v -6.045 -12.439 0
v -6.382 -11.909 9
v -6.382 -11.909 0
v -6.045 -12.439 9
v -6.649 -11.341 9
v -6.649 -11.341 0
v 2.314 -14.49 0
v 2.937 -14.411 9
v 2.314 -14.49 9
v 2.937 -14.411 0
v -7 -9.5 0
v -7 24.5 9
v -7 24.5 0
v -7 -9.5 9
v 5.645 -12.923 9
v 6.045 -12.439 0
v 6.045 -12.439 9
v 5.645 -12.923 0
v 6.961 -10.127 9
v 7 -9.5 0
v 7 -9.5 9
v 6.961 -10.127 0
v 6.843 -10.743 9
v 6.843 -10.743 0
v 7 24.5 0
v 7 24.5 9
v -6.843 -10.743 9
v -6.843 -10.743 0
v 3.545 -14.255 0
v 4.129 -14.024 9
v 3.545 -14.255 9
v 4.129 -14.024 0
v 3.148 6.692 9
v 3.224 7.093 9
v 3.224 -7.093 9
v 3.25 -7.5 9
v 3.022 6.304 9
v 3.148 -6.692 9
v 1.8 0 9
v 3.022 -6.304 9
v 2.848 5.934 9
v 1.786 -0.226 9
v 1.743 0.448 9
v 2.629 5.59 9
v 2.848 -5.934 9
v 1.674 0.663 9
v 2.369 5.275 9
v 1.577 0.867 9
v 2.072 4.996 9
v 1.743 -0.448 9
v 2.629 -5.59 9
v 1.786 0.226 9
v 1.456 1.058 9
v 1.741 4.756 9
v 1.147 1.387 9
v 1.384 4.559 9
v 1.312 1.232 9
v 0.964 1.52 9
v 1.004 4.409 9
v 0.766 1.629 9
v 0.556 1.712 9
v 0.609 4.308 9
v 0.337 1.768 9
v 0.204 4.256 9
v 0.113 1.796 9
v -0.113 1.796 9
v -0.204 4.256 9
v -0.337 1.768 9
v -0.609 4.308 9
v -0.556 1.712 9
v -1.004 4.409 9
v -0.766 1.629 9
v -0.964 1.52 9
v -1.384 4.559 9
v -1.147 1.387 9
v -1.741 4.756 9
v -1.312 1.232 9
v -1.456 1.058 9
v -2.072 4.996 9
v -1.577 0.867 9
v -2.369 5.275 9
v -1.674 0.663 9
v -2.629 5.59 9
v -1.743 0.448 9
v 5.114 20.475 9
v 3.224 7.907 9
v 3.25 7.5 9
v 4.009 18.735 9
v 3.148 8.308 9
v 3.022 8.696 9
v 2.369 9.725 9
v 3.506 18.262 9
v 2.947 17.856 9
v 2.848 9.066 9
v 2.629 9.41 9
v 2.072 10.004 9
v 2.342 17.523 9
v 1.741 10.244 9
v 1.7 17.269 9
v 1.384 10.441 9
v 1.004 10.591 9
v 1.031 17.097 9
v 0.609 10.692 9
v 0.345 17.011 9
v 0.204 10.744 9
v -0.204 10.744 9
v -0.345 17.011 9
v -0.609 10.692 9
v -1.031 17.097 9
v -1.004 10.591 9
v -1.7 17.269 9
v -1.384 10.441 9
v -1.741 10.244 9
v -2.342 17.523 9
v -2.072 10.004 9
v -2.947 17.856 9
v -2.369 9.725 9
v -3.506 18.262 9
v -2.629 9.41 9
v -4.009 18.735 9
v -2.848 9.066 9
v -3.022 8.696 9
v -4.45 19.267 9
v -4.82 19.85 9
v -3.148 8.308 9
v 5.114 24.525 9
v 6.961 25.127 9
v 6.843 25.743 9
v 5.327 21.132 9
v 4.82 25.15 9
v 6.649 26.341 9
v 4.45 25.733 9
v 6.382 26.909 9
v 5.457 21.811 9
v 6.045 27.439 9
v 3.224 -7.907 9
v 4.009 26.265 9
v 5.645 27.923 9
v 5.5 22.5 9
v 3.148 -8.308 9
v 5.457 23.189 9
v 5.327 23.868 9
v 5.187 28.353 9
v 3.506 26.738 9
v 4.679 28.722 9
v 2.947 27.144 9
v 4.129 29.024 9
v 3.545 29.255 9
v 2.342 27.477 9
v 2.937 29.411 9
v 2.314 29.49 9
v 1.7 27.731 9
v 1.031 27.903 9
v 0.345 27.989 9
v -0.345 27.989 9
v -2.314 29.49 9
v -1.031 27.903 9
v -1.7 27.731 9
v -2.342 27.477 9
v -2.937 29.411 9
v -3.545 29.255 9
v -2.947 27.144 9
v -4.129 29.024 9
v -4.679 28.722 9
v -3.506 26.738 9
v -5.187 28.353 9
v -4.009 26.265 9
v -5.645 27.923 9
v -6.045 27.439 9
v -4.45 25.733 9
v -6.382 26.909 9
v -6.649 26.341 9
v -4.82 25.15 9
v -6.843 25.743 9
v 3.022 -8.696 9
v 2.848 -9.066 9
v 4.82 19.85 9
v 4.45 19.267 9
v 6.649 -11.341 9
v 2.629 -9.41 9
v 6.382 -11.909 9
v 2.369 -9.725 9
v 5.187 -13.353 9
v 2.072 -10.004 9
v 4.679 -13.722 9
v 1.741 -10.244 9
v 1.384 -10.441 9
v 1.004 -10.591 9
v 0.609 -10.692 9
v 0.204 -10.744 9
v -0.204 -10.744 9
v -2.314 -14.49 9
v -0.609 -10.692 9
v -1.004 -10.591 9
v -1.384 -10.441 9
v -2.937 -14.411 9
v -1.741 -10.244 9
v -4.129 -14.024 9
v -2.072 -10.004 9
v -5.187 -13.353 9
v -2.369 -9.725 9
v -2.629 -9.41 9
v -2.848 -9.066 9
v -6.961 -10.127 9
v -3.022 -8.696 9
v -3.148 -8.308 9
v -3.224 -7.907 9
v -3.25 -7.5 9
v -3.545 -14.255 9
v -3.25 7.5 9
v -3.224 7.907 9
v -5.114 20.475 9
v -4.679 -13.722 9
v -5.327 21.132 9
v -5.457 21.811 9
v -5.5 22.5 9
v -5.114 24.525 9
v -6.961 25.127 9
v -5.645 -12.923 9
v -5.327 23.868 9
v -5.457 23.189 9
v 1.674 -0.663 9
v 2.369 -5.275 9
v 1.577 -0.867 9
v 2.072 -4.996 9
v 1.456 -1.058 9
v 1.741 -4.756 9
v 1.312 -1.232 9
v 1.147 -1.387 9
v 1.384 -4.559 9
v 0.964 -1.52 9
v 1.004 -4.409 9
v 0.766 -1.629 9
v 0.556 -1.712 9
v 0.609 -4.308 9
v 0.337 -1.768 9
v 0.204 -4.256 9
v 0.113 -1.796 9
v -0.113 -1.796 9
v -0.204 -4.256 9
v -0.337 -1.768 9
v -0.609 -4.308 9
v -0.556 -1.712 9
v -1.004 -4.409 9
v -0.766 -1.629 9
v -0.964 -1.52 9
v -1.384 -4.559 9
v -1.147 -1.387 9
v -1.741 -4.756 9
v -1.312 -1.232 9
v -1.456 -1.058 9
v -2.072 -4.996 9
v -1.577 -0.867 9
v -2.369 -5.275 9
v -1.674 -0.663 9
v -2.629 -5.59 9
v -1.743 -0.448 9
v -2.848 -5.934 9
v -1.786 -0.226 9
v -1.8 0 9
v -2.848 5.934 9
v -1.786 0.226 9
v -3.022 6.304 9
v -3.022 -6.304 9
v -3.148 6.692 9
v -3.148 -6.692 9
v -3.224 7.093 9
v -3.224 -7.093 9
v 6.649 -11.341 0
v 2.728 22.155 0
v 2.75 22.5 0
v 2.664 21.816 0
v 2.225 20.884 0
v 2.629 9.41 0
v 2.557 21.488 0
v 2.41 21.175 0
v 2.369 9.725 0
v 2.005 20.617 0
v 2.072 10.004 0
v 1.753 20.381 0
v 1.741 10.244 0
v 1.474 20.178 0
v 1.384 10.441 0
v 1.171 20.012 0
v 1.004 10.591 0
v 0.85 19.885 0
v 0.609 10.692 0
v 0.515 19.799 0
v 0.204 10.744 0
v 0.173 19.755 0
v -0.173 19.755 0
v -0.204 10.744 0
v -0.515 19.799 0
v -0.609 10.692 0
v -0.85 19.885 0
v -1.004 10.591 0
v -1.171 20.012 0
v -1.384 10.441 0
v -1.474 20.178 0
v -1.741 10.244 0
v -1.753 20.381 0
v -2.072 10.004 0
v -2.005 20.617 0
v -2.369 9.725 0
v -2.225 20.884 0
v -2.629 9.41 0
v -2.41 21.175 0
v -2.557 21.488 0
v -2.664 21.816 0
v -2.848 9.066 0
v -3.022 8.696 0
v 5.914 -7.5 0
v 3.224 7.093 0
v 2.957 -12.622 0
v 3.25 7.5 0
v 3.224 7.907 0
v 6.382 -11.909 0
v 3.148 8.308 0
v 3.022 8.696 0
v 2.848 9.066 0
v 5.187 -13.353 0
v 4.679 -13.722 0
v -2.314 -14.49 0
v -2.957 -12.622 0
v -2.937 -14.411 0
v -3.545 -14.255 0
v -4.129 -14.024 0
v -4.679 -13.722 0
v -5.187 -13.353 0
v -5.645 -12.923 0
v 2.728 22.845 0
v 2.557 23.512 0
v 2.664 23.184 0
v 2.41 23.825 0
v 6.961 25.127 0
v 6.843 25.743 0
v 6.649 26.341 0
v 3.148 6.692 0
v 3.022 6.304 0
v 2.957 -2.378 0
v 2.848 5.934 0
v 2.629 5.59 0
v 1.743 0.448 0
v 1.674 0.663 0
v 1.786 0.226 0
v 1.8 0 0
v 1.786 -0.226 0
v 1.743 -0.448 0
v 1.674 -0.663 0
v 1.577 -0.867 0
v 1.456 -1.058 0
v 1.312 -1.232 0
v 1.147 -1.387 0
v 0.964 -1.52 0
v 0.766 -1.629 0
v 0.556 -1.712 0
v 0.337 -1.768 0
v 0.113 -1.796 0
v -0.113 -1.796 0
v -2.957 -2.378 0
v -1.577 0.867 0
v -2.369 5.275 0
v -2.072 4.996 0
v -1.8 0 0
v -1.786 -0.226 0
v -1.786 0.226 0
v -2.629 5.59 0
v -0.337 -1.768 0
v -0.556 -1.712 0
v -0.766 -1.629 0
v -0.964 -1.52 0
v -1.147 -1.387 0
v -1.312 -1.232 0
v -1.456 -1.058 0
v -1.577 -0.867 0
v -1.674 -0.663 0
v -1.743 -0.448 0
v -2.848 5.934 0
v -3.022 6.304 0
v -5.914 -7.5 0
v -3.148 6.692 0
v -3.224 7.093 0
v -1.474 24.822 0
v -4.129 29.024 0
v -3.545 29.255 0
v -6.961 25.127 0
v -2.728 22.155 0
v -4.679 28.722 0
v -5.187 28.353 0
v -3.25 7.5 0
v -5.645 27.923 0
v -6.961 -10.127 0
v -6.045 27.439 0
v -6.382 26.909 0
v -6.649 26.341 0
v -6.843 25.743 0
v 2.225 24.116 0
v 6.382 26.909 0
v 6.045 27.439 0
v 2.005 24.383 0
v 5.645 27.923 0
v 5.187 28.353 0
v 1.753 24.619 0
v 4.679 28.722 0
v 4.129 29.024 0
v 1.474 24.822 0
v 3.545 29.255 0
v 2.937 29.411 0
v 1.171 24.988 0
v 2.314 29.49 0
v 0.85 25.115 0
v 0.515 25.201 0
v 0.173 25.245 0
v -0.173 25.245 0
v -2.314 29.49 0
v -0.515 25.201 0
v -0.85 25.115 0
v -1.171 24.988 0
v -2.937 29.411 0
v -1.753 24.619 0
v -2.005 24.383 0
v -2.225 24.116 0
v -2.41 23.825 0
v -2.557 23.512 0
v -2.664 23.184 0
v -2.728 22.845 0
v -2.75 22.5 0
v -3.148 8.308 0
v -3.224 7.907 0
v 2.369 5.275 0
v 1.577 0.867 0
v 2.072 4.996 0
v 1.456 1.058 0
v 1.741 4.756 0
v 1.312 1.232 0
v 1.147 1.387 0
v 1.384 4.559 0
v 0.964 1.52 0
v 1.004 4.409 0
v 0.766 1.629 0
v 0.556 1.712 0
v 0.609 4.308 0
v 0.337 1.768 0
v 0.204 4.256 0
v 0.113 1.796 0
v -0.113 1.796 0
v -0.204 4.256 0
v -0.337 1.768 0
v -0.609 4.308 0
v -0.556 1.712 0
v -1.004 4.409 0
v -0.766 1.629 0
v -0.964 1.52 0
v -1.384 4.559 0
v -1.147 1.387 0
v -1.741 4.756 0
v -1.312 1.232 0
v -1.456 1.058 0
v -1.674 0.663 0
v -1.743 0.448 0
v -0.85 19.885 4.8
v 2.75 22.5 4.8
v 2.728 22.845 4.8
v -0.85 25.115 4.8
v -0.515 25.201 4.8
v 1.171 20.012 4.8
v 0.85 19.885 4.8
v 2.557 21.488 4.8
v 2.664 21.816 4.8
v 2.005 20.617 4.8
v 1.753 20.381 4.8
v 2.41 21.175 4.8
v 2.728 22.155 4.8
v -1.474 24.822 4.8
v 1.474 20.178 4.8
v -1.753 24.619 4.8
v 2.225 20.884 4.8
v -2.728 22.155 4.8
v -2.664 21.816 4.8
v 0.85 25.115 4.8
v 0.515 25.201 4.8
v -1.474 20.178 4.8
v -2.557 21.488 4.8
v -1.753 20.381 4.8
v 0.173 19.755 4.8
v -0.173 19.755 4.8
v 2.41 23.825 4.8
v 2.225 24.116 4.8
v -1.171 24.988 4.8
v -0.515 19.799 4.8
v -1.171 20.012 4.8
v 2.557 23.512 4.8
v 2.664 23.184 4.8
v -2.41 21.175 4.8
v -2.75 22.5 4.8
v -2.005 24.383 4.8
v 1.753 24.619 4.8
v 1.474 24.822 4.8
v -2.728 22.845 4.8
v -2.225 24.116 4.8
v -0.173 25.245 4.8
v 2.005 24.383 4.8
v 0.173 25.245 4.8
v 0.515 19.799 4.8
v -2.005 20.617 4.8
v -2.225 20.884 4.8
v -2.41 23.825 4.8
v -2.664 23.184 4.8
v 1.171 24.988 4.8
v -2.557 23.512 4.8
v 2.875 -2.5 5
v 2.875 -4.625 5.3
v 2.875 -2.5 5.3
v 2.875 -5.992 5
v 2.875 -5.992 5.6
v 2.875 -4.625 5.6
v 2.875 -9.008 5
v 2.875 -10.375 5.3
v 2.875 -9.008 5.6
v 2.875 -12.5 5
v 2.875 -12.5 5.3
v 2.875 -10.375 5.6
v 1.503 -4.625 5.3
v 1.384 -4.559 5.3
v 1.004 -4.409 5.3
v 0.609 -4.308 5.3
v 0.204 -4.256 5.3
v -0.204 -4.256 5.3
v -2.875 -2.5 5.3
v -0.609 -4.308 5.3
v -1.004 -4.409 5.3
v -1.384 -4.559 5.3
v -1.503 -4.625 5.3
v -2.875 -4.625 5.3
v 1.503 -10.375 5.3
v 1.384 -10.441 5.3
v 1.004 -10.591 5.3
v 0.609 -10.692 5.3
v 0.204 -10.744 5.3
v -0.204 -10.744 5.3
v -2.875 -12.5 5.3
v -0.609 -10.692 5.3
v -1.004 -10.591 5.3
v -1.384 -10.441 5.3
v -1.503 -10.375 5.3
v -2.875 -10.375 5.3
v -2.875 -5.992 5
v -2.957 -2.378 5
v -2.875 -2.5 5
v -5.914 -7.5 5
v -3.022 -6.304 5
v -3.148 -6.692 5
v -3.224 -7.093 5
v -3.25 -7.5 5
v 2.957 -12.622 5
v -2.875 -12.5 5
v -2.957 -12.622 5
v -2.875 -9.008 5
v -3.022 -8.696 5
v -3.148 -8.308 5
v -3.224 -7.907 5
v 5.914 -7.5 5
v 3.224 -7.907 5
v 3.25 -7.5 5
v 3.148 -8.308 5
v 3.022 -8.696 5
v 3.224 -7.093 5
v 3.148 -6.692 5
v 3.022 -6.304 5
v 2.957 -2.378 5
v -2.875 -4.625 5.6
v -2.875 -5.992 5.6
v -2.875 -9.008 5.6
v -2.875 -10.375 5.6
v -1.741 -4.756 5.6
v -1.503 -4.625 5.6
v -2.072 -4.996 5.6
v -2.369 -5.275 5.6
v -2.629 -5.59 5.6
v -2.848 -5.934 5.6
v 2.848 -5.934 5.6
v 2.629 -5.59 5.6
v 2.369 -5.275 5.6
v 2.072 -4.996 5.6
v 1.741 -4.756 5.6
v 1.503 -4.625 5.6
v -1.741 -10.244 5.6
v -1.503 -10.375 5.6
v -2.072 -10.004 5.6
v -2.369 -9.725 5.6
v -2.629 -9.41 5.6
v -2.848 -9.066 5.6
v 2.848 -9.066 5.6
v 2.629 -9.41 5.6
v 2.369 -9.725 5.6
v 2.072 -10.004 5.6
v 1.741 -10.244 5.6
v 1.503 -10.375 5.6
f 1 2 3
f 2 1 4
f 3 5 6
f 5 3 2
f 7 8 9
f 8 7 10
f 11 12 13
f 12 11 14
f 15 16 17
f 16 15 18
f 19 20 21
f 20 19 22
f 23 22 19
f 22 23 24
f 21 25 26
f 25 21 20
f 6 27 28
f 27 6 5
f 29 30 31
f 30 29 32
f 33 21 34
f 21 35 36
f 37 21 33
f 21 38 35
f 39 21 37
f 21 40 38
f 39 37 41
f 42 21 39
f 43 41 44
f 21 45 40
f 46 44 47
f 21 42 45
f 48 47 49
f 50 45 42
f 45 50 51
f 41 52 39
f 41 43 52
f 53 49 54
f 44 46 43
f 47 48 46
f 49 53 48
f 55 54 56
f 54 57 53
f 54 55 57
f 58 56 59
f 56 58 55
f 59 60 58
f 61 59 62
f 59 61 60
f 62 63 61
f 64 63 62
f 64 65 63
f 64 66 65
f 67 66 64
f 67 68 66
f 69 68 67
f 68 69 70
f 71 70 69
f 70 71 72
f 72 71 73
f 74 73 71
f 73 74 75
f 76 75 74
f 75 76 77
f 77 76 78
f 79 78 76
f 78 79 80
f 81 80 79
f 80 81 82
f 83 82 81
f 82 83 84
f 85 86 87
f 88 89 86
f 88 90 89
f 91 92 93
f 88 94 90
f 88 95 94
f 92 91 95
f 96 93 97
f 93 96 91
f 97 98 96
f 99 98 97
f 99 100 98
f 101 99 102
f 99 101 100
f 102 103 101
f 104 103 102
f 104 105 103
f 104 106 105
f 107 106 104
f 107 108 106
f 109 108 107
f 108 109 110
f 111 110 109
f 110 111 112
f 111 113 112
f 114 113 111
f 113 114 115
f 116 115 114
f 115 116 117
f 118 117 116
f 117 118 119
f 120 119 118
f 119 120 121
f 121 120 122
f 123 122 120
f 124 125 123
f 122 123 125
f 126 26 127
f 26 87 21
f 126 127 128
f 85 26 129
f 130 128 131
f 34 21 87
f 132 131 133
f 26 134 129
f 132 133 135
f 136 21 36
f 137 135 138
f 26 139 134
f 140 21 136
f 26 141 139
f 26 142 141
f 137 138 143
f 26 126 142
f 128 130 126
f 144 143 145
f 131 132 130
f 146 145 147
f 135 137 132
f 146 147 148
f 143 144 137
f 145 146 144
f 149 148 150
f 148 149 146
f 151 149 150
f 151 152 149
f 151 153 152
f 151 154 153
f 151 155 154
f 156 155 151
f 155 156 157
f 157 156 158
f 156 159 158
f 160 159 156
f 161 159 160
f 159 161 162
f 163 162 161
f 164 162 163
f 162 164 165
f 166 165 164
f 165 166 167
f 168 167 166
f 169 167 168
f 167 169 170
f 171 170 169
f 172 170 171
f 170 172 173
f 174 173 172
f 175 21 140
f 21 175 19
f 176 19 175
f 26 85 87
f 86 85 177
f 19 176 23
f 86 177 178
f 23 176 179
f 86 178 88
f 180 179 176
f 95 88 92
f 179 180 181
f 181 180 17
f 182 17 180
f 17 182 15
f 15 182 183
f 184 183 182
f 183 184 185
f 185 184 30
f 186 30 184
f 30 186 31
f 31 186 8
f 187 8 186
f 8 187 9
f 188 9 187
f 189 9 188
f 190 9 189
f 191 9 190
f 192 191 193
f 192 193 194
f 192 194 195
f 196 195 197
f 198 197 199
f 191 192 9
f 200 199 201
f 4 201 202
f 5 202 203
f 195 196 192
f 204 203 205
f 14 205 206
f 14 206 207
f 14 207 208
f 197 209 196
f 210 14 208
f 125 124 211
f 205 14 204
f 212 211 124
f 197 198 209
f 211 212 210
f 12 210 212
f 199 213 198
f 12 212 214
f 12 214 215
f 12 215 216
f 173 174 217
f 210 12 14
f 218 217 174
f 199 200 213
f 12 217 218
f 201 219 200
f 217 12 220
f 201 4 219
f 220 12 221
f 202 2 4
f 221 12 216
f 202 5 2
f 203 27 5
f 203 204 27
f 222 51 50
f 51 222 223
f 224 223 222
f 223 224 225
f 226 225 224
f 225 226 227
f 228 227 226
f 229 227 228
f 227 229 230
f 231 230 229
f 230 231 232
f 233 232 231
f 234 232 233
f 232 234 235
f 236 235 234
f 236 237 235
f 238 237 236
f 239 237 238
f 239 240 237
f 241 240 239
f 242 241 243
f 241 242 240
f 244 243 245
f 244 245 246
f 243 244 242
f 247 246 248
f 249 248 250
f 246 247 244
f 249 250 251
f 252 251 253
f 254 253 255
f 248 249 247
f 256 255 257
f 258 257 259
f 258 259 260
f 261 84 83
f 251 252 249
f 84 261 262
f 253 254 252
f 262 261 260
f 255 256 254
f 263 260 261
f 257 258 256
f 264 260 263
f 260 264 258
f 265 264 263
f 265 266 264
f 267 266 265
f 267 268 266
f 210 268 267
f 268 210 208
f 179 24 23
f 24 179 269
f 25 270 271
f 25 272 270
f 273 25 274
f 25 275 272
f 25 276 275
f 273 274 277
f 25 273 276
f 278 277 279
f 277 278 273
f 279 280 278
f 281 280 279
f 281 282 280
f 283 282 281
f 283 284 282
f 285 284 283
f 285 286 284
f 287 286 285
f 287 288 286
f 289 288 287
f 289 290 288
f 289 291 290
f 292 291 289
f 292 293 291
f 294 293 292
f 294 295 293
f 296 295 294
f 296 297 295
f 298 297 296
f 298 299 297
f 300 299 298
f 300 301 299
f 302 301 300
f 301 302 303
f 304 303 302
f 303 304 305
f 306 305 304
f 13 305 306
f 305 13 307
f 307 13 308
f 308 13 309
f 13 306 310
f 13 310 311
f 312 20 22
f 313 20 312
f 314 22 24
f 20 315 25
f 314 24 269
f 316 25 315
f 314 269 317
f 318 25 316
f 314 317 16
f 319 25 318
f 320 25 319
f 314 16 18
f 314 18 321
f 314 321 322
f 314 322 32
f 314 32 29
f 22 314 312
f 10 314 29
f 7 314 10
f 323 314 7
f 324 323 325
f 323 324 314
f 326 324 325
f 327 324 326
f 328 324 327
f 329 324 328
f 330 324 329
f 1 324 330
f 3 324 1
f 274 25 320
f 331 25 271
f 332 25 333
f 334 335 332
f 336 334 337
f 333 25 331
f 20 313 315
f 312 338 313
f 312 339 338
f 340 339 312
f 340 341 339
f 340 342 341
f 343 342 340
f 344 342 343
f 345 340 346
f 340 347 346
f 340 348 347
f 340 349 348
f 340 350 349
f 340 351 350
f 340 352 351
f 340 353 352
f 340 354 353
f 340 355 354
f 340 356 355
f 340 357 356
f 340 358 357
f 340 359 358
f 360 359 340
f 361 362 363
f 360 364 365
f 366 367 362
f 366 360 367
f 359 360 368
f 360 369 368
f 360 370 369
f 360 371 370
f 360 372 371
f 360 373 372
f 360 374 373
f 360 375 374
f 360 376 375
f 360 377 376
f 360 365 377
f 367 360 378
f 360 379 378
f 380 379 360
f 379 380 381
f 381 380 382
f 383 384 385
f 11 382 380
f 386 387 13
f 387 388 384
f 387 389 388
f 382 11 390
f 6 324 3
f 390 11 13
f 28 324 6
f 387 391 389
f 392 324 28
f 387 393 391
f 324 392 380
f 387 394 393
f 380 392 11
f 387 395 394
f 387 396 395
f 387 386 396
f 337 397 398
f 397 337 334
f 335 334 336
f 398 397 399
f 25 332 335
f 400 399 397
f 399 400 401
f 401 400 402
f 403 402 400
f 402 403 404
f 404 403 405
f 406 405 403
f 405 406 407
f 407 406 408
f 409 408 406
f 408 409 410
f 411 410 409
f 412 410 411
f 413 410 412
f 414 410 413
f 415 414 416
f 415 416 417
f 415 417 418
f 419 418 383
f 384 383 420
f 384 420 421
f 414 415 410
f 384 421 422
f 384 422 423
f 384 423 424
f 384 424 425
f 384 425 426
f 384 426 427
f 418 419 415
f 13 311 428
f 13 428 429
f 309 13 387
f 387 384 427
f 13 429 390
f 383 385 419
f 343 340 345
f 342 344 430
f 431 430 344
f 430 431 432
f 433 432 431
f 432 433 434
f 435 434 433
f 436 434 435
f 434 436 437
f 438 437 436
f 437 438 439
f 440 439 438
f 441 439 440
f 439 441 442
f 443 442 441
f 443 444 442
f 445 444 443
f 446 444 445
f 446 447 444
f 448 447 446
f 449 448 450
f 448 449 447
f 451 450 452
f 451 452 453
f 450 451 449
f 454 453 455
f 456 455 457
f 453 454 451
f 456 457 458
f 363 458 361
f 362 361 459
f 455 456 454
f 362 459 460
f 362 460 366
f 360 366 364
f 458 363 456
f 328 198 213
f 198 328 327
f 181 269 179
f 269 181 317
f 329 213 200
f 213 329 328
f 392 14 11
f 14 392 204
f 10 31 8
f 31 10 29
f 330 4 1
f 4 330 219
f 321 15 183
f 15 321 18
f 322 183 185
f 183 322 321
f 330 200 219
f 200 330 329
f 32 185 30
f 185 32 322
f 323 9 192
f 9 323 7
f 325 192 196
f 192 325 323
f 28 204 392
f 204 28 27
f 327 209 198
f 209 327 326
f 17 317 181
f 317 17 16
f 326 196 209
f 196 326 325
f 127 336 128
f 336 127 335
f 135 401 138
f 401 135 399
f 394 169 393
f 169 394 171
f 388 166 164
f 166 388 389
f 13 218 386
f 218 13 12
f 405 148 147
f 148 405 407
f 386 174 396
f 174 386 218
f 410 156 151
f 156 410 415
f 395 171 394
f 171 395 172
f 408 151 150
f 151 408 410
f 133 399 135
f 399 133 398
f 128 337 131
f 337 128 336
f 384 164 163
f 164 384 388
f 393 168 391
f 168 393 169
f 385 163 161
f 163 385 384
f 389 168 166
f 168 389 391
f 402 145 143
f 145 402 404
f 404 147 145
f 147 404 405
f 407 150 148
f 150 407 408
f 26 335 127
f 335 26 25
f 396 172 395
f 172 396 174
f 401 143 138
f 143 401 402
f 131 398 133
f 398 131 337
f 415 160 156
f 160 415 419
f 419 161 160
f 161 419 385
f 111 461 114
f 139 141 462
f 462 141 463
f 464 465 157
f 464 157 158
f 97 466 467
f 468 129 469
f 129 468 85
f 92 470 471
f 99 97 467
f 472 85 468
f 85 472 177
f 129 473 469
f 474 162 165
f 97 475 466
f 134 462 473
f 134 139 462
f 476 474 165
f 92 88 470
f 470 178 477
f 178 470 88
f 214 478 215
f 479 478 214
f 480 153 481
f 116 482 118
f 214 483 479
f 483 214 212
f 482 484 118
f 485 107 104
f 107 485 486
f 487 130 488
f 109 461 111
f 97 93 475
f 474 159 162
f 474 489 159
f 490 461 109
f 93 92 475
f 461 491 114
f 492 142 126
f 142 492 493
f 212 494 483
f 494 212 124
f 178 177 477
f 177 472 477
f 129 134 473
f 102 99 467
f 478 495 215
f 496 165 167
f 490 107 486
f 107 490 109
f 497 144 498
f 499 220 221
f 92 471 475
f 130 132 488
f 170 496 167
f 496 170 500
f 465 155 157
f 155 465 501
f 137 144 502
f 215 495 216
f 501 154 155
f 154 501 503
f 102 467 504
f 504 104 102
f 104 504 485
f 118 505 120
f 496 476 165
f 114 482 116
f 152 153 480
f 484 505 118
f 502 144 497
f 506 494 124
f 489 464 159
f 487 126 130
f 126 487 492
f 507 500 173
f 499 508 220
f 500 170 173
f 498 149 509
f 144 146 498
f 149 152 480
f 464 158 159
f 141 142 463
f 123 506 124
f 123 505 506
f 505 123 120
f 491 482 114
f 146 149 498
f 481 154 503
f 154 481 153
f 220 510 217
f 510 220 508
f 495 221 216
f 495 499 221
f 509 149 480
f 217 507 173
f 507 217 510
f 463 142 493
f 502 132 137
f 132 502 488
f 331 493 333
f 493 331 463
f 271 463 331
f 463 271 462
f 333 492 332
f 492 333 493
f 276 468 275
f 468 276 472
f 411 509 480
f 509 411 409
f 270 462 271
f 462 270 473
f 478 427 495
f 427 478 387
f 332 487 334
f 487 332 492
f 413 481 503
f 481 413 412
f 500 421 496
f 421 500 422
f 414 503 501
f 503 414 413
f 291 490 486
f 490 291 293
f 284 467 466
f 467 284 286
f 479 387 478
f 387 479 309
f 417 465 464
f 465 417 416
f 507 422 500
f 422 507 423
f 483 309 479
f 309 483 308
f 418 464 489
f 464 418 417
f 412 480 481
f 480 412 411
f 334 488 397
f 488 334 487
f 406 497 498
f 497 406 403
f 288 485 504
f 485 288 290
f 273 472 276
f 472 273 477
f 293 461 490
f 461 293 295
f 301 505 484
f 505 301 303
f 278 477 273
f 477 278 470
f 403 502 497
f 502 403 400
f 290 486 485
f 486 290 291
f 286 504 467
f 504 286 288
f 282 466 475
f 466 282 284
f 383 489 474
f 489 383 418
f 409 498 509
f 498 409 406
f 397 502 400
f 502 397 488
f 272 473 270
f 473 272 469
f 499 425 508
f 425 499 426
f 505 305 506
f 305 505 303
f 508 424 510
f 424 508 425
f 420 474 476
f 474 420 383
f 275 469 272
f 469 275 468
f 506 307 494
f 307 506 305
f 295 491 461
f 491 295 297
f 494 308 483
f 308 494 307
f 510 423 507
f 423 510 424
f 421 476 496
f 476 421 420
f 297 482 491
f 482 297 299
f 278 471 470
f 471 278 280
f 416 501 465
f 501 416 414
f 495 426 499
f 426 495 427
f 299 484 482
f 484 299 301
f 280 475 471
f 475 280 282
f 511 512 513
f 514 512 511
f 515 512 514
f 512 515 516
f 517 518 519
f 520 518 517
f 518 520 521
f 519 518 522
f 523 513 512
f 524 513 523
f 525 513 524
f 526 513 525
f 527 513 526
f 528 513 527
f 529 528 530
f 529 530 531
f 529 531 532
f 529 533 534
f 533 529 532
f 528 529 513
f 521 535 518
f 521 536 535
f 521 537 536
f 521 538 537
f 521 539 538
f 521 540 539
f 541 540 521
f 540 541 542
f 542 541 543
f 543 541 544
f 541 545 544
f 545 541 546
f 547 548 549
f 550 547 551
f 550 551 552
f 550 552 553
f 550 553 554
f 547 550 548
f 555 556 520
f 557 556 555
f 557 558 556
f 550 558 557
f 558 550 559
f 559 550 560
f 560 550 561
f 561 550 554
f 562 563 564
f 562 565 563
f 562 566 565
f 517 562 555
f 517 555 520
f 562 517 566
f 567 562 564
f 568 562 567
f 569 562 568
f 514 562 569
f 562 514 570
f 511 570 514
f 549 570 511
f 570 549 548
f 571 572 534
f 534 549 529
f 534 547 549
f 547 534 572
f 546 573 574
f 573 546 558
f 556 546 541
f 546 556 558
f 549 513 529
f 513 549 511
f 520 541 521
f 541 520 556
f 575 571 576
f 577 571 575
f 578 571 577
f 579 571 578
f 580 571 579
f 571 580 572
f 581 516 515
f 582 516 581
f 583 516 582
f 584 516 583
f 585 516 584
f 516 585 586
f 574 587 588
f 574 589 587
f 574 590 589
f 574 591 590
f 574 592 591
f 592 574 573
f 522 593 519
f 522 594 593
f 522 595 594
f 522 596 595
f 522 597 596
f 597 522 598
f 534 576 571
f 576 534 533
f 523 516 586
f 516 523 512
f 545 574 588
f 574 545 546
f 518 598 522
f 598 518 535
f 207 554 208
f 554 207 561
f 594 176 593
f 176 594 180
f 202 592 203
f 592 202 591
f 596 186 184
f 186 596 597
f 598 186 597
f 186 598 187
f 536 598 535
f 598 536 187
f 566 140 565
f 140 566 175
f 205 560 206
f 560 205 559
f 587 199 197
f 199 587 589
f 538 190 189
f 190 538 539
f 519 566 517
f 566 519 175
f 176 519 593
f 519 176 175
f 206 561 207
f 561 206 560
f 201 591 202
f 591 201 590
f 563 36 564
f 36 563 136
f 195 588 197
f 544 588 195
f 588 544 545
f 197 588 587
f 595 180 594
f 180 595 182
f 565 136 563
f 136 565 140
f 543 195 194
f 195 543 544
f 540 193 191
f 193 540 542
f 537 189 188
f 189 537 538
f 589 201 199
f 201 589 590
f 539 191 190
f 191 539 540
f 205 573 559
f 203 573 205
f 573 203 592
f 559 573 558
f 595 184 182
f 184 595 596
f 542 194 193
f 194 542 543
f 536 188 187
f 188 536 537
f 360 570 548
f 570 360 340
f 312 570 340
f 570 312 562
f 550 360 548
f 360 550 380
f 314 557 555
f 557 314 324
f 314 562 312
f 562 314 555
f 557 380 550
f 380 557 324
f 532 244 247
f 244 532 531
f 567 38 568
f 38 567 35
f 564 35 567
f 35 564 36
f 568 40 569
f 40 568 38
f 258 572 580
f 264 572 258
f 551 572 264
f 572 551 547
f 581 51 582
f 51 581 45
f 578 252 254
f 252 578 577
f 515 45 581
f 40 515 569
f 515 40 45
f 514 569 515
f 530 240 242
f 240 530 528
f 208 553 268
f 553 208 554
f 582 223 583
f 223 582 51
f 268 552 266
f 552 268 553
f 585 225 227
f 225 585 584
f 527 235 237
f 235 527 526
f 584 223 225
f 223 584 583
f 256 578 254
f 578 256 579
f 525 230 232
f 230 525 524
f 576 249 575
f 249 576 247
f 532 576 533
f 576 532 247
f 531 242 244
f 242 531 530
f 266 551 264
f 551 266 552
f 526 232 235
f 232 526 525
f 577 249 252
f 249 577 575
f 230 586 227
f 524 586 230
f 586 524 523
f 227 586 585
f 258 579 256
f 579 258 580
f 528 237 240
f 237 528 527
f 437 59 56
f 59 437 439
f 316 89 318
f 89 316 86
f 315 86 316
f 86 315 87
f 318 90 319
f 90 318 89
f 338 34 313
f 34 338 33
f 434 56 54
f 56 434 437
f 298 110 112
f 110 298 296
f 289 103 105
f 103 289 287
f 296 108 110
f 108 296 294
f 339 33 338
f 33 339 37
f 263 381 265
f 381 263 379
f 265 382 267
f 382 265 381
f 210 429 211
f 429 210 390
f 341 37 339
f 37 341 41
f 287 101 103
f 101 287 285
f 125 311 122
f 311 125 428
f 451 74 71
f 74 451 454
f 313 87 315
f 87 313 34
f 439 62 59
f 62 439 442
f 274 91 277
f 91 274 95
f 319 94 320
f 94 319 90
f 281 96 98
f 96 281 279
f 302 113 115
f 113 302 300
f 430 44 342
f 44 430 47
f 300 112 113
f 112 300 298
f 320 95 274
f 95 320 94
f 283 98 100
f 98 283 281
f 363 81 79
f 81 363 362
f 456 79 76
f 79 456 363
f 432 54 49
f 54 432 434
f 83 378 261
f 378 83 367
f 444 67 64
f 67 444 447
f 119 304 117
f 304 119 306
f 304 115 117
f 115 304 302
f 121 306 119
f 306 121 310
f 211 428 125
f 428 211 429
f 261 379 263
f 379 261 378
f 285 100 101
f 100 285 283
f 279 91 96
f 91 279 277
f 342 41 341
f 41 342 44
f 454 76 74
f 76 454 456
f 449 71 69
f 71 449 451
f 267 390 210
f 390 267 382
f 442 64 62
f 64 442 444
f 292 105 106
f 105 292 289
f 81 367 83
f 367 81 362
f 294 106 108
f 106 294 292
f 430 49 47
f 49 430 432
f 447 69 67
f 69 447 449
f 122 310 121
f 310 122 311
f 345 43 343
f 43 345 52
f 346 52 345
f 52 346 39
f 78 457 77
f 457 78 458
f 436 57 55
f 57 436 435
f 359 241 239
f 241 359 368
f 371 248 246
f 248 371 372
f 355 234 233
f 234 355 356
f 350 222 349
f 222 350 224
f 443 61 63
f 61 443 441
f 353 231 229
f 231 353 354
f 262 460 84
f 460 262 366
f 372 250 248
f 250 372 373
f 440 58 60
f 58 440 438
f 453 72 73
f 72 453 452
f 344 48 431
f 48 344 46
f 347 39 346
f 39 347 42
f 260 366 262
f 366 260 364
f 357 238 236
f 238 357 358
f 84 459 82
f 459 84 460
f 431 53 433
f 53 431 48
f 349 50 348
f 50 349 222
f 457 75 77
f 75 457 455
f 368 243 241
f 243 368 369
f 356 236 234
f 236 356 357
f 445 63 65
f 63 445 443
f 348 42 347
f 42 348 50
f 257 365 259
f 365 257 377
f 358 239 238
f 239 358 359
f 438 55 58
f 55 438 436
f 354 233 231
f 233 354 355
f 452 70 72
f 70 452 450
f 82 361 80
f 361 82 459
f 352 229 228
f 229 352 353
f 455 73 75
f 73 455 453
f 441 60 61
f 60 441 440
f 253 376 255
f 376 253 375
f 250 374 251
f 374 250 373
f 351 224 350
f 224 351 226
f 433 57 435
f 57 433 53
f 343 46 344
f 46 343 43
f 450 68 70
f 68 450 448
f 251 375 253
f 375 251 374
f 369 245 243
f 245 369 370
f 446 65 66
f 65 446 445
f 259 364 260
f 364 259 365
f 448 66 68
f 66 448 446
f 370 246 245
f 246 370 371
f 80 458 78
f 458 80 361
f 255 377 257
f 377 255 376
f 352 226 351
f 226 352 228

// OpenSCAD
$fn = 50;


difference() {
	union() {
		hull() {
			translate(v = [-2.0000000000, 9.5000000000, 0]) {
				cylinder(h = 9, r = 5);
			}
			translate(v = [2.0000000000, 9.5000000000, 0]) {
				cylinder(h = 9, r = 5);
			}
			translate(v = [-2.0000000000, -9.5000000000, 0]) {
				cylinder(h = 9, r = 5);
			}
			translate(v = [2.0000000000, -9.5000000000, 0]) {
				cylinder(h = 9, r = 5);
			}
		}
		translate(v = [0.0000000000, 15.0000000000, 0]) {
			hull() {
				translate(v = [-2.0000000000, 9.5000000000, 0]) {
					cylinder(h = 9, r = 5);
				}
				translate(v = [2.0000000000, 9.5000000000, 0]) {
					cylinder(h = 9, r = 5);
				}
				translate(v = [-2.0000000000, -9.5000000000, 0]) {
					cylinder(h = 9, r = 5);
				}
				translate(v = [2.0000000000, -9.5000000000, 0]) {
					cylinder(h = 9, r = 5);
				}
			}
		}
		translate(v = [0.0000000000, 15.0000000000, 0]) {
			hull() {
				translate(v = [-2.0000000000, 9.5000000000, 0]) {
					cylinder(h = 9, r = 5);
				}
				translate(v = [2.0000000000, 9.5000000000, 0]) {
					cylinder(h = 9, r = 5);
				}
				translate(v = [-2.0000000000, -9.5000000000, 0]) {
					cylinder(h = 9, r = 5);
				}
				translate(v = [2.0000000000, -9.5000000000, 0]) {
					cylinder(h = 9, r = 5);
				}
			}
		}
	}
	union() {
		translate(v = [0.0000000000, 22.5000000000, 9]) {
			rotate(a = [0, 0, 0]) {
				difference() {
					union() {
						#translate(v = [0, 0, -9.0000000000]) {
							cylinder(h = 9, r = 2.2500000000);
						}
						#translate(v = [0, 0, -4.2000000000]) {
							cylinder(h = 4.2000000000, r1 = 2.7500000000, r2 = 5.5000000000);
						}
						#translate(v = [0, 0, -9.0000000000]) {
							cylinder(h = 9, r = 2.7500000000);
						}
						#translate(v = [0, 0, -9.0000000000]) {
							cylinder(h = 9, r = 2.2500000000);
						}
					}
					union();
				}
			}
		}
		translate(v = [0.0000000000, 22.5000000000, 9]) {
			rotate(a = [0, 0, 0]) {
				difference() {
					union() {
						#translate(v = [0, 0, -9.0000000000]) {
							cylinder(h = 9, r = 2.2500000000);
						}
						#translate(v = [0, 0, -4.2000000000]) {
							cylinder(h = 4.2000000000, r1 = 2.7500000000, r2 = 5.5000000000);
						}
						#translate(v = [0, 0, -9.0000000000]) {
							cylinder(h = 9, r = 2.7500000000);
						}
						#translate(v = [0, 0, -9.0000000000]) {
							cylinder(h = 9, r = 2.2500000000);
						}
					}
					union();
				}
			}
		}
		translate(v = [0.0000000000, -7.5000000000, 0]) {
			rotate(a = [0, 0, 0]) {
				difference() {
					union() {
						#translate(v = [-2.8750000000, -5.0000000000, -0.3000000000]) {
							cube(size = [5.7500000000, 10, 0.3000000000]);
						}
						#translate(v = [-2.8750000000, -2.8750000000, -0.6000000000]) {
							cube(size = [5.7500000000, 5.7500000000, 0.3000000000]);
						}
						#translate(v = [-2.8750000000, -5.0000000000, 5]) {
							cube(size = [5.7500000000, 10, 0.3000000000]);
						}
						#translate(v = [-2.8750000000, -2.8750000000, 5.3000000000]) {
							cube(size = [5.7500000000, 5.7500000000, 0.3000000000]);
						}
						#translate(v = [0, 0, -100.0000000000]) {
							cylinder(h = 200, r = 3.2500000000);
						}
						#linear_extrude(height = 5) {
							polygon(points = [[5.9142500000, 0.0000000000], [2.9571250000, 5.1218907443], [-2.9571250000, 5.1218907443], [-5.9142500000, 0.0000000000], [-2.9571250000, -5.1218907443], [2.9571250000, -5.1218907443]]);
						}
						#translate(v = [-2.8750000000, -5.0000000000, -0.3000000000]) {
							cube(size = [5.7500000000, 10, 0.3000000000]);
						}
						#translate(v = [-2.8750000000, -2.8750000000, -0.6000000000]) {
							cube(size = [5.7500000000, 5.7500000000, 0.3000000000]);
						}
						#translate(v = [-2.8750000000, -5.0000000000, 5]) {
							cube(size = [5.7500000000, 10, 0.3000000000]);
						}
						#translate(v = [-2.8750000000, -2.8750000000, 5.3000000000]) {
							cube(size = [5.7500000000, 5.7500000000, 0.3000000000]);
						}
						#translate(v = [0, 0, -100.0000000000]) {
							cylinder(h = 200, r = 3.2500000000);
						}
						#translate(v = [-2.8750000000, -5.0000000000, -0.3000000000]) {
							cube(size = [5.7500000000, 10, 0.3000000000]);
						}
						#translate(v = [-2.8750000000, -2.8750000000, -0.6000000000]) {
							cube(size = [5.7500000000, 5.7500000000, 0.3000000000]);
						}
						#translate(v = [-2.8750000000, -5.0000000000, 5]) {
							cube(size = [5.7500000000, 10, 0.3000000000]);
						}
						#translate(v = [-2.8750000000, -2.8750000000, 5.3000000000]) {
							cube(size = [5.7500000000, 5.7500000000, 0.3000000000]);
						}
						#translate(v = [0, 0, -100.0000000000]) {
							cylinder(h = 200, r = 3.2500000000);
						}
					}
					union();
				}
			}
		}
		translate(v = [0.0000000000, -7.5000000000, 0]) {
			translate(v = [0, 0, -100]) {
				cylinder(h = 200, r = 3.2500000000);
			}
		}
		translate(v = [0.0000000000, 7.5000000000, 0]) {
			translate(v = [0, 0, -100]) {
				cylinder(h = 200, r = 3.2500000000);
			}
		}
		translate(v = [0.0000000000, -7.5000000000, 0]) {
			translate(v = [0, 0, -100]) {
				cylinder(h = 200, r = 1.8000000000);
			}
		}
		translate(v = [0, 0, -100]) {
			cylinder(h = 200, r = 1.8000000000);
		}
		translate(v = [0.0000000000, 7.5000000000, 0]) {
			translate(v = [0, 0, -100]) {
				cylinder(h = 200, r = 1.8000000000);
			}
		}
	}
}
